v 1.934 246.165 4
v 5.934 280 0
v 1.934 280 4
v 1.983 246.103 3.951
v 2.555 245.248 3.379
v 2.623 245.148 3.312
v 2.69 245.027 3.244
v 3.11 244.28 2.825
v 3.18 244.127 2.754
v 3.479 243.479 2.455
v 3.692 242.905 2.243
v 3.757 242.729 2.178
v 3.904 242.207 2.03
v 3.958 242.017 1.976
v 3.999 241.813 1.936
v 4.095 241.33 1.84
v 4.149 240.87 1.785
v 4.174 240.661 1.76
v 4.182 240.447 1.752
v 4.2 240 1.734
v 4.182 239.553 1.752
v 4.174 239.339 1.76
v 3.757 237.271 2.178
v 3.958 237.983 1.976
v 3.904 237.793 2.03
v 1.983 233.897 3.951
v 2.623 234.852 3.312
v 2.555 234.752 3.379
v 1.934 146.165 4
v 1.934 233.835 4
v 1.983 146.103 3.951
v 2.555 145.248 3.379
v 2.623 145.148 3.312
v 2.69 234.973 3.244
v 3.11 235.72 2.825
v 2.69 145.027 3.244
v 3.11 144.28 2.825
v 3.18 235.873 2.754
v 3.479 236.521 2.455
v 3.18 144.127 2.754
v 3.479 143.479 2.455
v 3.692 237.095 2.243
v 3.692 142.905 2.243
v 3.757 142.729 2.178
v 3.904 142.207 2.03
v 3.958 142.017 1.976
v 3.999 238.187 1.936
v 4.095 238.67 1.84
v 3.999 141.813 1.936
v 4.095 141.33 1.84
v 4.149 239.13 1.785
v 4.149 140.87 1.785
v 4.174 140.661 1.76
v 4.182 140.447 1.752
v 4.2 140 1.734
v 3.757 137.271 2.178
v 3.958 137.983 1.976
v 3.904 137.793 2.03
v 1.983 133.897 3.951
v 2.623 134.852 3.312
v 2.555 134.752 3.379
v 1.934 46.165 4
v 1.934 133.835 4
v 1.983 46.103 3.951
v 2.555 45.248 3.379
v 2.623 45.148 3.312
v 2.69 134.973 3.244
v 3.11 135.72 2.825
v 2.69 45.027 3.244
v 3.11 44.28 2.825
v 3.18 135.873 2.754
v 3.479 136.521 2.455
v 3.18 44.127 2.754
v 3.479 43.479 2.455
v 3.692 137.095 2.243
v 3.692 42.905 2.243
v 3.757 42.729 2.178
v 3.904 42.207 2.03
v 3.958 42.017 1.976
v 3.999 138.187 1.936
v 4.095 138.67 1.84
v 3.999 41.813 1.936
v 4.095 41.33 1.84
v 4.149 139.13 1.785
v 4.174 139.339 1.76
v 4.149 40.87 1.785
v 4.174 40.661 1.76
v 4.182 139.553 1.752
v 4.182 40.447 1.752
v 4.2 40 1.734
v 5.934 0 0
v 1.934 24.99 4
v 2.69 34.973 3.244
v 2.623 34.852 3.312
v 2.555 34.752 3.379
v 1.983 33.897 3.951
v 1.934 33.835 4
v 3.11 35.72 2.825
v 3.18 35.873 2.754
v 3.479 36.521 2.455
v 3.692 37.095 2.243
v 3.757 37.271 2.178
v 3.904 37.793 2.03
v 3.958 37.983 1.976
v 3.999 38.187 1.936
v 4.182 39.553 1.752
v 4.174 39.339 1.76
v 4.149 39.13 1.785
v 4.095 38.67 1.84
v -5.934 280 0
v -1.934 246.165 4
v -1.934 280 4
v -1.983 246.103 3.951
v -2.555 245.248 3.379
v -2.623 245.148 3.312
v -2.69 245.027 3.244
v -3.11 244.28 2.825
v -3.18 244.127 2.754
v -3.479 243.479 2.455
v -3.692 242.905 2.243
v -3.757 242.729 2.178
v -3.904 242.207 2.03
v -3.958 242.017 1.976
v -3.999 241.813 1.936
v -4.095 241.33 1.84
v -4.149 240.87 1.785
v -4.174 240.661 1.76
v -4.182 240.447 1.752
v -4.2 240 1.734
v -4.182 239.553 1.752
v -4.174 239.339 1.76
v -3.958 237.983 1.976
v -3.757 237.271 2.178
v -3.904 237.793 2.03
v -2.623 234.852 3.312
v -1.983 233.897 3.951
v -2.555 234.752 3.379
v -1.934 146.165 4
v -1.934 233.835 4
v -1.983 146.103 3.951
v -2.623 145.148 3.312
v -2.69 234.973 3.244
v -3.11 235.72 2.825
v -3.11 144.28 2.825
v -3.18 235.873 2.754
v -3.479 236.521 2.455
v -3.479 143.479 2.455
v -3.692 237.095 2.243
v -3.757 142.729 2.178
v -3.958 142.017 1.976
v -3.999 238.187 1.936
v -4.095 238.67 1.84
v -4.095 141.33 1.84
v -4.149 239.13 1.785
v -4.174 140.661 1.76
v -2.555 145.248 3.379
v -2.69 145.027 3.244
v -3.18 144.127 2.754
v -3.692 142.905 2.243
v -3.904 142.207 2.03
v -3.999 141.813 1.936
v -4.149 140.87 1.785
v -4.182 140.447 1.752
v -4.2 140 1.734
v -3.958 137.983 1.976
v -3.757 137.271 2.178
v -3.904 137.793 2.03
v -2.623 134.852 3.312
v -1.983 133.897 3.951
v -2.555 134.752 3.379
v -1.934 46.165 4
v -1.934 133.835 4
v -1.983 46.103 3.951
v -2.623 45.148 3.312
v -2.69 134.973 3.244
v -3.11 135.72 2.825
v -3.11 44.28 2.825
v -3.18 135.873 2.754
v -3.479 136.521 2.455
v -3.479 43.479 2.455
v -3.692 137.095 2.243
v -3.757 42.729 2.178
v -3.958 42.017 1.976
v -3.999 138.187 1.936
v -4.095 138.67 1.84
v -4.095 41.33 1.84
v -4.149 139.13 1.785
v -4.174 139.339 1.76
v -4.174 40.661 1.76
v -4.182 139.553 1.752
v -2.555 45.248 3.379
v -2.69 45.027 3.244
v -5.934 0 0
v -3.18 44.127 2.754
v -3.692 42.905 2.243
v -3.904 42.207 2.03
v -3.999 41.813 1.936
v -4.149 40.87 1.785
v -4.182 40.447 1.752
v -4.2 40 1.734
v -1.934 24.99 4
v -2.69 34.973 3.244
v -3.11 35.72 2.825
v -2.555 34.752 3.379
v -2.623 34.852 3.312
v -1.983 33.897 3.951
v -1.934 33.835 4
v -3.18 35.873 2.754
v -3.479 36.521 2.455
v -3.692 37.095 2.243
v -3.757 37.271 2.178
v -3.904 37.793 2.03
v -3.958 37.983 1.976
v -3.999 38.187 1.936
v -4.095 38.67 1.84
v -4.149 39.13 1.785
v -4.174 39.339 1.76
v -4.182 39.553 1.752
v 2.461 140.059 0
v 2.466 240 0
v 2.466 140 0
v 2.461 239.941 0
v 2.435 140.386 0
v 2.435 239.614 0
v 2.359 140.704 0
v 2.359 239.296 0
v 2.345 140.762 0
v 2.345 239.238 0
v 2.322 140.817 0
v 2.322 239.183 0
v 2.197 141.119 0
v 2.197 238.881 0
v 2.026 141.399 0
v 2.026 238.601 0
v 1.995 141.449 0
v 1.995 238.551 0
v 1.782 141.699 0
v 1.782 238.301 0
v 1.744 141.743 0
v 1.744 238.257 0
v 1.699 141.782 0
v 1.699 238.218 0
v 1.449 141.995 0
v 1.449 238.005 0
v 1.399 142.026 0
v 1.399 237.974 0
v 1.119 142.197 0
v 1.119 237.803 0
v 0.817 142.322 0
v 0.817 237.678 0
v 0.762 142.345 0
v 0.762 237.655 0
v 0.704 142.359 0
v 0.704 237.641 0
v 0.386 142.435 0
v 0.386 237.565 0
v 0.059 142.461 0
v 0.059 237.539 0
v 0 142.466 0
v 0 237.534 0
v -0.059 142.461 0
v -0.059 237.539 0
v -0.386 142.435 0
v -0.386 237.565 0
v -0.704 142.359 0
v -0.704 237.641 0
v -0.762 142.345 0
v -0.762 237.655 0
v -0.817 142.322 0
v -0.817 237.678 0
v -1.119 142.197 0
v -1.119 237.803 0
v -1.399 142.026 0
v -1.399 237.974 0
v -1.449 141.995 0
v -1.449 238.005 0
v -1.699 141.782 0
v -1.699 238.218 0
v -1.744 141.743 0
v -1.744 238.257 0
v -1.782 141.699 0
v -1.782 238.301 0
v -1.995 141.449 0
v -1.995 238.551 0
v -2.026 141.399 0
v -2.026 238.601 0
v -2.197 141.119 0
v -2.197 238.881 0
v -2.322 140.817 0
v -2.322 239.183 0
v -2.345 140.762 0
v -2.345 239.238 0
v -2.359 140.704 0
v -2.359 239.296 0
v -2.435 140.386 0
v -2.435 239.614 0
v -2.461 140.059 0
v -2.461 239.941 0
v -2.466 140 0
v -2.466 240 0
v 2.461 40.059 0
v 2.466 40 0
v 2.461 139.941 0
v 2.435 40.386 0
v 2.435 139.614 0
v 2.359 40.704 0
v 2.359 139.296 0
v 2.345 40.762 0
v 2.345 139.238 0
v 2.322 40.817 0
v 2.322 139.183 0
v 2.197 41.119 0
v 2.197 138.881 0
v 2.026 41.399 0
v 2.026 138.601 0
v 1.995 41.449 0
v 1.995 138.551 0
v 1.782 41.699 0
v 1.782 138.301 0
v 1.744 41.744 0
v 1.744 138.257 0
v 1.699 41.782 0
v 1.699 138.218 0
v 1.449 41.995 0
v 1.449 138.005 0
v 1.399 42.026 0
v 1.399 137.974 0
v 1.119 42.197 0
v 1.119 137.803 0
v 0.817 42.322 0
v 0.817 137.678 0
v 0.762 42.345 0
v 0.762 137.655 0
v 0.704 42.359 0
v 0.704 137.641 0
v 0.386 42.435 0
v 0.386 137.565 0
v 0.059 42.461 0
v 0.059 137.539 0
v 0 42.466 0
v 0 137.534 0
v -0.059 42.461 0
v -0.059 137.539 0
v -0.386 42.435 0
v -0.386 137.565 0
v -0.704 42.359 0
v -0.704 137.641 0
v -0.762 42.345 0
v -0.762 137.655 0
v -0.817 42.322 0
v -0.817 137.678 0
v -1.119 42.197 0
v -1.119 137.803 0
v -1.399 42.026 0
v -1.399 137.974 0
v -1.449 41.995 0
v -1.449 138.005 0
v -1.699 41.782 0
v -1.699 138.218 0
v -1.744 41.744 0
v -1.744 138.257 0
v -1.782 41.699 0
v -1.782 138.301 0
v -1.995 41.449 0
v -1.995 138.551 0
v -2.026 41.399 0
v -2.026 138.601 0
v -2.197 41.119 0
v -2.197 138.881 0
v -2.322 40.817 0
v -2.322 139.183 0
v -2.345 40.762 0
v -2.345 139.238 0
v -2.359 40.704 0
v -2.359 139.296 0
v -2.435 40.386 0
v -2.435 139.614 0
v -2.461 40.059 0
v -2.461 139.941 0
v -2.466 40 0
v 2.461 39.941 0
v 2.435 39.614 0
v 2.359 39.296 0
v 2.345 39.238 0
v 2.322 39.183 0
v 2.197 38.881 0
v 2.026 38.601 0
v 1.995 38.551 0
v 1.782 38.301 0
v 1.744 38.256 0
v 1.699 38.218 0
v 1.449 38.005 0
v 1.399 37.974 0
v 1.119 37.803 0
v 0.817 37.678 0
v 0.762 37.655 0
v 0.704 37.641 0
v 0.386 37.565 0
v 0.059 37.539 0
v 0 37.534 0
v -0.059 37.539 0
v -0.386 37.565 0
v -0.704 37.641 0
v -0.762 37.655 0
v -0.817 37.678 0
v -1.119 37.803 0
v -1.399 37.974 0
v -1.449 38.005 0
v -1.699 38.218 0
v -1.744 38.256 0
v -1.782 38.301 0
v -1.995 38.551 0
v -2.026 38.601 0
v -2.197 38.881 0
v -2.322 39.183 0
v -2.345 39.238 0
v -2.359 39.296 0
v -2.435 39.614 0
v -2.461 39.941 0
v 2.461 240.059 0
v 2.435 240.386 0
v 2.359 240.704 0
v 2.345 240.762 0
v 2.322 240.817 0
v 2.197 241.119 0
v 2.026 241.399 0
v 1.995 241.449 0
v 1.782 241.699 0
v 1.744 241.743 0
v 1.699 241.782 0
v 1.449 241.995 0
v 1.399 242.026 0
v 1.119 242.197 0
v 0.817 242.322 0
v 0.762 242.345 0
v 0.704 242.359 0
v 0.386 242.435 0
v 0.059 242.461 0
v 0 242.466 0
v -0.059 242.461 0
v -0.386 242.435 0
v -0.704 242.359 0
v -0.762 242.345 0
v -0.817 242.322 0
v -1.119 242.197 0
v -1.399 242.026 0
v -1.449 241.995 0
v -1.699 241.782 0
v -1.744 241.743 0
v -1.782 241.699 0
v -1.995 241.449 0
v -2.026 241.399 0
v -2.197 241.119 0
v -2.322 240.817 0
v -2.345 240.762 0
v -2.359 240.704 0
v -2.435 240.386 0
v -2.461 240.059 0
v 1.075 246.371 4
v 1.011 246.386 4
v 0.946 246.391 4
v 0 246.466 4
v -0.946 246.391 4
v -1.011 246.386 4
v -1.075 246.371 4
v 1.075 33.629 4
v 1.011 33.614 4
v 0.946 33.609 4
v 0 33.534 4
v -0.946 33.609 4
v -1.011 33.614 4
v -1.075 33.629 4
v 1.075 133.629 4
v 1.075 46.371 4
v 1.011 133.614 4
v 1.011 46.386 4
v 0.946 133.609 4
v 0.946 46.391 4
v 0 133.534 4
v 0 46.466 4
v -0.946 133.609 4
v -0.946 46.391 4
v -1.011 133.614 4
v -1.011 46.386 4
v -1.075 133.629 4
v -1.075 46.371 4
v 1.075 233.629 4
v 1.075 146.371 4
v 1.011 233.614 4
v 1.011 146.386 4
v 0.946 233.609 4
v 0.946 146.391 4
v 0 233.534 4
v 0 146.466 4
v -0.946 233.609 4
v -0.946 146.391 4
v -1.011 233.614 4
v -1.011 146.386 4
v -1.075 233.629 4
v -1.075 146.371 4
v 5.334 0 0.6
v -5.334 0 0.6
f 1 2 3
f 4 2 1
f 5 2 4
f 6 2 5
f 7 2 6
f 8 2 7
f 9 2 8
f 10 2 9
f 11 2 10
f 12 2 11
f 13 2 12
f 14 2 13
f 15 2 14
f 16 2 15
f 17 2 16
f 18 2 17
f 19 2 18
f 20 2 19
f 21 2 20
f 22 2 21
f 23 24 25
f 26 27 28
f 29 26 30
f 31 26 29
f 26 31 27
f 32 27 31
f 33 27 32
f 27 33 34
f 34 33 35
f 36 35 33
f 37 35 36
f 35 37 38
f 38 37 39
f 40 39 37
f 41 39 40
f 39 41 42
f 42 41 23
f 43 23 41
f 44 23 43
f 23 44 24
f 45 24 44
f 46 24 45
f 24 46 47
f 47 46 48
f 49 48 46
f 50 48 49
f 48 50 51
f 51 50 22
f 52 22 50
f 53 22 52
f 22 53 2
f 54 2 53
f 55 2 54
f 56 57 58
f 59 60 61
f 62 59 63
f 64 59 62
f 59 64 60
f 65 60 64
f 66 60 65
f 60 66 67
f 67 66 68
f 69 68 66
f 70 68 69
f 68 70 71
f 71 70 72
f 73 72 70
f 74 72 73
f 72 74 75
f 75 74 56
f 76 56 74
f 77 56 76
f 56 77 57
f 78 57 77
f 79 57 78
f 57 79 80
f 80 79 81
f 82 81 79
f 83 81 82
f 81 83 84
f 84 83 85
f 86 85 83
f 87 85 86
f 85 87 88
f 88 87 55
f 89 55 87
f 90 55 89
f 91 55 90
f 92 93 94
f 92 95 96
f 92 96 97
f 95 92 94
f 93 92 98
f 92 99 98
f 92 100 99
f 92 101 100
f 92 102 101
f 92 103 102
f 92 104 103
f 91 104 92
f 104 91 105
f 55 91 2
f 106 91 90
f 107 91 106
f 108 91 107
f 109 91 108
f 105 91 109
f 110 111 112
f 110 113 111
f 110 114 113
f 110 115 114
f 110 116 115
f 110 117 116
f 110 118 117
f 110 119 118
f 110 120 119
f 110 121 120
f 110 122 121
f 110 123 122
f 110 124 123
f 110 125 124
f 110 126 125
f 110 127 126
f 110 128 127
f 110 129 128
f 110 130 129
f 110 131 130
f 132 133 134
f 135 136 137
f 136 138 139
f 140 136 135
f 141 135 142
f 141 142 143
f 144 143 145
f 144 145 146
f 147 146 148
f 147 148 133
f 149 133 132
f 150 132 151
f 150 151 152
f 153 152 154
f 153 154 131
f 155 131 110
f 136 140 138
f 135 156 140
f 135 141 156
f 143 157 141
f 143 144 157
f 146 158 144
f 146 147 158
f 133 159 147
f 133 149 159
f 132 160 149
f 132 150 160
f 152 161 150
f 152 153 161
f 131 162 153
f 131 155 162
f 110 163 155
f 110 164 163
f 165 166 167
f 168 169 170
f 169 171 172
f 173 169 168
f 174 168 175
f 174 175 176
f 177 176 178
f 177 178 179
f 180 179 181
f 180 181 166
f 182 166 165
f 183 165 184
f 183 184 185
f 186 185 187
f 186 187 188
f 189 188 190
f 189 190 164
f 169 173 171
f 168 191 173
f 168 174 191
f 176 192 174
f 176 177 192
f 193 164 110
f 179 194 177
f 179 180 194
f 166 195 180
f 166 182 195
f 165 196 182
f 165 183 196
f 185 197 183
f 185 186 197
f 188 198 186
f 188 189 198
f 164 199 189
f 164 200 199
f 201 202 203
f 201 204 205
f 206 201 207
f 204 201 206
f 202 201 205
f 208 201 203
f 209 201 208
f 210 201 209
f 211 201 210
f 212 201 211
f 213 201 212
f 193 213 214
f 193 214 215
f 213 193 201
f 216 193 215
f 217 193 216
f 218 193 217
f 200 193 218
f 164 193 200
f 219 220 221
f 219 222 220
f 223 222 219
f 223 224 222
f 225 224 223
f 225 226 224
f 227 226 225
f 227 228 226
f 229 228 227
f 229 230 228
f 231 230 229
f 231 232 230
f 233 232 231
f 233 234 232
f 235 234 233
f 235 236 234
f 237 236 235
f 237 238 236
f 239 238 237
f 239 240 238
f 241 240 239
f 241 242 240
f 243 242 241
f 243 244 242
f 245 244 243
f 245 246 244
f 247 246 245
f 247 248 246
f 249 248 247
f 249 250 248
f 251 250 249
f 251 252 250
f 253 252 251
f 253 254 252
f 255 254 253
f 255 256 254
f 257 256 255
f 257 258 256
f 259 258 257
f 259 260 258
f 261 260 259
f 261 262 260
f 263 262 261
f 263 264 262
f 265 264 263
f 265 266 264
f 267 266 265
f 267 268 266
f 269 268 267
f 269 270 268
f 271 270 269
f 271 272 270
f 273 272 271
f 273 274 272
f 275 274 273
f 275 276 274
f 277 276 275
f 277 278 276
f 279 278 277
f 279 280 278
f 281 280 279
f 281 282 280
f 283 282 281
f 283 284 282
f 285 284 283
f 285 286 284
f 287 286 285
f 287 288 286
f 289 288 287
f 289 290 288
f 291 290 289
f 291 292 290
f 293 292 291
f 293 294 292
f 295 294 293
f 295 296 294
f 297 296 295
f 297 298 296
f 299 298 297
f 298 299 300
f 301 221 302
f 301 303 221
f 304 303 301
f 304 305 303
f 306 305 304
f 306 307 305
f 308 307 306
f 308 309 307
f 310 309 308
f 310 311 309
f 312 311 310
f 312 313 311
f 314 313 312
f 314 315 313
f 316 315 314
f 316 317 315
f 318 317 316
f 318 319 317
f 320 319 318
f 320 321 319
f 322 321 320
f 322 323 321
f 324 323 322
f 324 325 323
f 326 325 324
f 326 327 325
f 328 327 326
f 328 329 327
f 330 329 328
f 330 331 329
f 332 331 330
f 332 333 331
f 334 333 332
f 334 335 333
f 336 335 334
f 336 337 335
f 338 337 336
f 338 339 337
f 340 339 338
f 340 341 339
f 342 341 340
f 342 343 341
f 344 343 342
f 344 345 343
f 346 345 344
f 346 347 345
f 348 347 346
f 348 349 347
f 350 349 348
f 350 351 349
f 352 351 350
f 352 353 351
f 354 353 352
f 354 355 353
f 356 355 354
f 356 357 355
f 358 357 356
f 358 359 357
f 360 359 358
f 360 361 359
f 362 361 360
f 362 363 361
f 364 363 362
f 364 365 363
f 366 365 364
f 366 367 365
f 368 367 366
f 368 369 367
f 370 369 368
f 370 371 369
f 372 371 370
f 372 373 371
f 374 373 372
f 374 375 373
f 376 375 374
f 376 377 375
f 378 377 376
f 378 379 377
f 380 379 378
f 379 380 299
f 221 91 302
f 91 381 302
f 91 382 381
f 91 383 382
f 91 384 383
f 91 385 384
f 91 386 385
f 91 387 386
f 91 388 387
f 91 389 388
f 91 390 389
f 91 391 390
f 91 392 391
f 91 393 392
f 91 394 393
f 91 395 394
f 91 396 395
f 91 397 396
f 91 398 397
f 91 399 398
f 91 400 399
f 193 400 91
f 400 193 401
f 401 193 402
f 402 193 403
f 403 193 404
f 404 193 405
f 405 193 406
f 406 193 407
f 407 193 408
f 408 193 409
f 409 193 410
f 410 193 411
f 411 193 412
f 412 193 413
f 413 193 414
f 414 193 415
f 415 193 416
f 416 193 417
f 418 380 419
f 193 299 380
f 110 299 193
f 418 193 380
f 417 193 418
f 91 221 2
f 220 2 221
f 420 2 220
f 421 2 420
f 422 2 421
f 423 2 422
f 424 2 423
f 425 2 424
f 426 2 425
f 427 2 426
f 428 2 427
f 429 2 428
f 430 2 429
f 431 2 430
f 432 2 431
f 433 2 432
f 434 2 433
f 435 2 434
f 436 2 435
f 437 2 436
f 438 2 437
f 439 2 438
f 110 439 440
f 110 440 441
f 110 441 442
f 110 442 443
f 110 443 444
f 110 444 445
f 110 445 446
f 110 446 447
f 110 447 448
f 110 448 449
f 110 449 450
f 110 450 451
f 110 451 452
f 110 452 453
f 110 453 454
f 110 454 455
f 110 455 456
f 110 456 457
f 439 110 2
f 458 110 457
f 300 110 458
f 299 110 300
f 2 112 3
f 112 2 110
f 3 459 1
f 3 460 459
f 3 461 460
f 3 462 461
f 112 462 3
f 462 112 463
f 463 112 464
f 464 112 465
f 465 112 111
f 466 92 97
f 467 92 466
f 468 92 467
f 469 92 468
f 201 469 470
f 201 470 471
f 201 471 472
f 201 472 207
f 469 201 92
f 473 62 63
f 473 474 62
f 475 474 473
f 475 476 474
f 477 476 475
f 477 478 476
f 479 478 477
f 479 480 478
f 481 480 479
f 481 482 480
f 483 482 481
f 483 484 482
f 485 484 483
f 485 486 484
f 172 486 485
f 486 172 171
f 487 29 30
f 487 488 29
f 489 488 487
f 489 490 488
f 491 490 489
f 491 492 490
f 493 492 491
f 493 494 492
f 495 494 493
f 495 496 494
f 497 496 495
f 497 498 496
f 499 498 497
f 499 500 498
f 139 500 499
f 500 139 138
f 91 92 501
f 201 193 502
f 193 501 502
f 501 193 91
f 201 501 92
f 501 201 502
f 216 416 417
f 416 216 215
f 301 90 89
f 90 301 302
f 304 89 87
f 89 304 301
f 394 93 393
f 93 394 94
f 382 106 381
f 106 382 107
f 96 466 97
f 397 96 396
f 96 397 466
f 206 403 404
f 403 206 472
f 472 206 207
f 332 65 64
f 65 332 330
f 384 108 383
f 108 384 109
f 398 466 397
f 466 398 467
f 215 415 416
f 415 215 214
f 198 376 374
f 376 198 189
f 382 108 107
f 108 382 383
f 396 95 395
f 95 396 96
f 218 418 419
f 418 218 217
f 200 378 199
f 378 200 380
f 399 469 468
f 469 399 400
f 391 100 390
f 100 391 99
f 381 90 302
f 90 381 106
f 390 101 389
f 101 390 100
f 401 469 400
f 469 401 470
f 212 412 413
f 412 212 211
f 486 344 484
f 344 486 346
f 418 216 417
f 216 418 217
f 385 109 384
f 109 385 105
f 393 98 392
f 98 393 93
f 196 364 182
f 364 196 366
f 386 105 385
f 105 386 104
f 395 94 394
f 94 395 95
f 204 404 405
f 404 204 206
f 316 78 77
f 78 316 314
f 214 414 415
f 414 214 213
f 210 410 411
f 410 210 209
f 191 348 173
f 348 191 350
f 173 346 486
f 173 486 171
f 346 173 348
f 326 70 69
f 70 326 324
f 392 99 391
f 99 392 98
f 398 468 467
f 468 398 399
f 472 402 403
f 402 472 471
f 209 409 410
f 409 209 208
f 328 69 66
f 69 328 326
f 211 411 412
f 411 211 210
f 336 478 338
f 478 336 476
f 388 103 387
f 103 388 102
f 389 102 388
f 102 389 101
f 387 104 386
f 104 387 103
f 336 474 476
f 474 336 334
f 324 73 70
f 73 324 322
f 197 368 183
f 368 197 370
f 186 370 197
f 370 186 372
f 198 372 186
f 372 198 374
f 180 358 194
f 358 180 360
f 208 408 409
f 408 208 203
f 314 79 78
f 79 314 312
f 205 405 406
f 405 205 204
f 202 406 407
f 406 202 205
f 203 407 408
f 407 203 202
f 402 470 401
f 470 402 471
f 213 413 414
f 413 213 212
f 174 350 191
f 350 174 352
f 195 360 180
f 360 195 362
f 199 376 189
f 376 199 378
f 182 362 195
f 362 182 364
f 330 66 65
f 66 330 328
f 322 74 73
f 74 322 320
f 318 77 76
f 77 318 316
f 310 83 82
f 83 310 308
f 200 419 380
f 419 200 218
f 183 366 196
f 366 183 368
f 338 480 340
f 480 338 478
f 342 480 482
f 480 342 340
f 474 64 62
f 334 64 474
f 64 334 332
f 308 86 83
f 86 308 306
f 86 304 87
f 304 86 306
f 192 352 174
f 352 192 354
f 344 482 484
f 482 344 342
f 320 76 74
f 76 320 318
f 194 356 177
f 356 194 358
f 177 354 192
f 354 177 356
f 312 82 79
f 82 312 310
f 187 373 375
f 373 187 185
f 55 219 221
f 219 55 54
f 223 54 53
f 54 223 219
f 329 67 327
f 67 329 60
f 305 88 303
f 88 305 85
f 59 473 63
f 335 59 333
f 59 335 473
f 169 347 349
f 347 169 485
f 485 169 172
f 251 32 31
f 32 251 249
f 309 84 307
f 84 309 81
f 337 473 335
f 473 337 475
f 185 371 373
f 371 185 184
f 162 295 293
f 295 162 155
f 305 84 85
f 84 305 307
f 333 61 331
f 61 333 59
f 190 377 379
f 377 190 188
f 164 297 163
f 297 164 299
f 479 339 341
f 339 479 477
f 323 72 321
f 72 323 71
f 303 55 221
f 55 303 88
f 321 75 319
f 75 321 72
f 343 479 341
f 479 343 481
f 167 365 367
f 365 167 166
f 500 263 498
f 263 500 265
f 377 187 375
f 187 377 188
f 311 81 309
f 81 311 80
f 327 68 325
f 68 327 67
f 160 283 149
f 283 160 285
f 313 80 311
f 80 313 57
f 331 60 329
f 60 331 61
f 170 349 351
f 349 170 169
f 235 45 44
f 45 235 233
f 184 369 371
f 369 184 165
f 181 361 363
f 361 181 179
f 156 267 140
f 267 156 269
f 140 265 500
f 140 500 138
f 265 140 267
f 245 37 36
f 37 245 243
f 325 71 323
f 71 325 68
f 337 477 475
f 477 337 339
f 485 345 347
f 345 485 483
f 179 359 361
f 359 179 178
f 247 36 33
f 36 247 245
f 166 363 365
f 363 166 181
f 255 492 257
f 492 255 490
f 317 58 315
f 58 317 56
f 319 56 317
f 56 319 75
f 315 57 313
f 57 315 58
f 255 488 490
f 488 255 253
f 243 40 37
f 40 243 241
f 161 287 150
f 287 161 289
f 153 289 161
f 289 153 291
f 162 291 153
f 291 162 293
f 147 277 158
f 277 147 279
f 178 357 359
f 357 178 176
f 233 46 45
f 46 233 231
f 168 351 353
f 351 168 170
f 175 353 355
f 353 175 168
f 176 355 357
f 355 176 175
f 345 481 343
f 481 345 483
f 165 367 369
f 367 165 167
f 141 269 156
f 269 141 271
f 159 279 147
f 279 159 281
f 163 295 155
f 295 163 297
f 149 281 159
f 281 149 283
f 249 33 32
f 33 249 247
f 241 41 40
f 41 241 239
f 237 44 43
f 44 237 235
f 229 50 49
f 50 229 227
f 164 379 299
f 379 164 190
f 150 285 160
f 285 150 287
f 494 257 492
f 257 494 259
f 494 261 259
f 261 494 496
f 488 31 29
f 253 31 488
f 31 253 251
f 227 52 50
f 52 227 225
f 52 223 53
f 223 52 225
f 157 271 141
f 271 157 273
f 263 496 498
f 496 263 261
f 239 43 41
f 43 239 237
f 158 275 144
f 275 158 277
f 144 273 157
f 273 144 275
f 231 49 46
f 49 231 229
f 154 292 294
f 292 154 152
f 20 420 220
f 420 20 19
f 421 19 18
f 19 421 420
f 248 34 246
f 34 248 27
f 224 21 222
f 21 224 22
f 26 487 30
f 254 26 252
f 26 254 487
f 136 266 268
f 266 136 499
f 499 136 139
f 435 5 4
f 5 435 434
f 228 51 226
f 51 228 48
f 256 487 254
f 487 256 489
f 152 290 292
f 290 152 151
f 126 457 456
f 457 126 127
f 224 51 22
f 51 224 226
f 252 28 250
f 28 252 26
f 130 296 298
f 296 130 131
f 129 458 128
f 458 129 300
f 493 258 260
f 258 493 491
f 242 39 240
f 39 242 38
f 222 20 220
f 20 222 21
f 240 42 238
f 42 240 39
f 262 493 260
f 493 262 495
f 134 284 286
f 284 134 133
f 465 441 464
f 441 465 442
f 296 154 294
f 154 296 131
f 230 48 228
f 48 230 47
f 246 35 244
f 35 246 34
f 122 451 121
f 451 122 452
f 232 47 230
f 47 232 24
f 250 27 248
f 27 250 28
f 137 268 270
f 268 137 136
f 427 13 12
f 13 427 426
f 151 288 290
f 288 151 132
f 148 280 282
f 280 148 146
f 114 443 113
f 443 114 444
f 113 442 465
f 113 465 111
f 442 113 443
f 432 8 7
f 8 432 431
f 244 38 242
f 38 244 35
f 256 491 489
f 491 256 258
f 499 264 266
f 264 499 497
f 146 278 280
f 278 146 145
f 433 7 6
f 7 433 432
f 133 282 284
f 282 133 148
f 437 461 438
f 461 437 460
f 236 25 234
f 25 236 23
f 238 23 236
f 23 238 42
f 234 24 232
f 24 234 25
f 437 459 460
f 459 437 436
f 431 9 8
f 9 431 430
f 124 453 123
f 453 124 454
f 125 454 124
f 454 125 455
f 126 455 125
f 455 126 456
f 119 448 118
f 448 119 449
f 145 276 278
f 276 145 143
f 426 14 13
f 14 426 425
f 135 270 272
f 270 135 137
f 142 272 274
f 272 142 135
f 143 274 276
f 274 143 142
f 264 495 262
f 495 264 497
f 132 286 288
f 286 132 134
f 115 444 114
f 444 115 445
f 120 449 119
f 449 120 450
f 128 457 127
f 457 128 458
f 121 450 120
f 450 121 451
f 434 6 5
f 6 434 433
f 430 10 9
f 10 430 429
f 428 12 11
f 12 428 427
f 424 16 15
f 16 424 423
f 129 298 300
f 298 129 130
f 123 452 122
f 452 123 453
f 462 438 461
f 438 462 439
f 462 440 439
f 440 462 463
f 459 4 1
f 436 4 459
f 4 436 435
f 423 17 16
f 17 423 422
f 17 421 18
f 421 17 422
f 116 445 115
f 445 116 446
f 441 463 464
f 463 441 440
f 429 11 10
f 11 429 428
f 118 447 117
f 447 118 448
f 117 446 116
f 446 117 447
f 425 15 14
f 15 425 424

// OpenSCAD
// =====================================================================
//  Vodiaca lista pre kosiky do skrine
//  Priskrutkuje sa na policu do medzery medzi kosiky (alebo ku stene skrine).
//  Boky hrebena maju 45 st. a kopiruju spodne skosenie kosika
//  (skos_dole v priklad-kosik.scad) -> kosik sa pri zasunuti sam vycentruje
//  a nema kam ujst do strany. Kosik stoji na polici, nie na liste.
//  Vruty so zapustenou hlavou (4x16): hlava je zapustena tak hlboko,
//  aby sa nedotkla skosenia kosika; zahlbenie 90 st. pokracuje plynulo
//  az po vrch hrebena (bez hranatych vyrezov).
//
//  NASTAVENIE SLICERA (Bambu Studio):
//    Tryska ............ 0.6 mm (ide aj 0.4)   Vrstva ......... 0.30 mm
//    Wall loops ........ 3                     Top/bottom ..... 4 / 4
//    Vypln ............. 30 % gyroid           Material ....... PLA
//    Doska ............. Textured PEI          Podpery ........ NIE (boky 45 st.)
//    Orientacia ........ spodkom na dosku
// =====================================================================

/* [Rozmery] */
dlzka   = 280;     // dlzka listy (hlbka kosika je 300; max ~315 na H2C)
typ     = "stred"; // ["stred", "kraj"] stred = medzi dva kosiky, kraj = ku stene skrine
medzera = 3;       // medzera medzi kosikmi (stred) alebo kosikom a stenou (kraj), mm

/* [Volby] */
nabeh      = true;  // predny koniec hrebena zosikmeny – kosik sa lahsie navedie
skrutky    = true;  // diery pre vruty so zapustenou hlavou
pocet_skr  = 3;     // pocet vrutov na listu

/* [Vrut] */
vrut_d     = 4;     // priemer vrutu (4x16)
vrut_hlava = 8;     // priemer zapustenej hlavy (90 st.)

/* [Tlac] */
vola  = 0.4;   // vola medzi bokom hrebena a skosenim kosika (kolmo na plochu)
paska = 0.0;   // hrubka podlozky/pasky pod listou (pri vrutoch 0)

/* [Konstanty – zhodne s kosikom] */
skos_dole = 5;     // 45 st. skosenie spodnej hrany kosika (priklad-kosik.scad)
rezerva_h = 1.0;   // hreben konci o tolko pod koncom skosenia – nikdy nezdvihne kosik
nabeh_l   = 25;    // dlzka nabehu na prednom konci
okraj_skr = 40;    // vzdialenost krajnych vrutov od koncov listy
max_do_polic = 0.5; // o kolko moze spodok hlavy vrutu zajst do police (drevotrieska)
e = 0.01;
$fn = 40;

// ---------------------------------------------------------------------
// Geometria: os x naprieč listou (0 = stred medzery, pri "kraj" = stena),
// os z nahor od polic. Bok kosika vpravo je pri x = g/2, jeho skosenie je
// priamka x + z = g/2 + skos_dole. Bok hrebena je s nou rovnobezny,
// posunuty o volu kolmo -> vodorovne o vola*sqrt(2).
g     = typ == "stred" ? medzera : 2 * medzera;   // "kraj" = polovica stredovej listy
h     = skos_dole - paska - rezerva_h;            // vyska hrebena nad listou
xb    = g/2 + skos_dole - paska - vola*sqrt(2);   // polovicna sirka pri spodku
xt    = xb - h;                                   // polovicna sirka hore

// vrut: zahlbenie 90 st.; vrch hlavy co najvyssie, ale mimo skosenia kosika
r_hl  = (vrut_hlava + 0.4) / 2;                   // polomer zahlbenia hore
r_dr  = (vrut_d + 0.4) / 2;                       // polomer diery pre driek
kuz_h = r_hl - r_dr;                              // hlbka kuzela zahlbenia
xs    = typ == "stred" ? 0 : r_hl;                // poloha vrutu naprieč (kraj: ku stene)
z_hl  = min(h, g/2 + skos_dole - paska - (xs + r_hl) - vola*sqrt(2));  // vrch hlavy

assert(h > 1, "hreben je prilis nizky – zmensi pasku alebo rezervu");
assert(xt > 0.8, "hreben je hore prilis uzky – zvacsi medzeru alebo zmensi volu");
assert(dlzka <= 315, "lista sa nezmesti na podlozku H2C");
assert(!skrutky || z_hl >= kuz_h - max_do_polic,
       str("hlava vrutu sa nezmesti mimo skosenia kosika – zvacsi medzeru (pre typ ",
           typ, " aspon ~", typ == "stred" ? 3 : 5.5, " mm) alebo vypni skrutky"));

echo(str("lista ", typ, ": spodok ", (typ == "stred" ? 2*xb : xb), " mm, vrch ",
         (typ == "stred" ? 2*xt : xt), " mm, vyska ", h, " mm",
         skrutky ? str(", vrch hlavy z = ", z_hl, " mm, hlava zajde do police ",
                       max(0, kuz_h - z_hl), " mm") : ""));

// 2D profil prierezu (x, z)
module profil(hh = h) {
    xt2 = xb - hh;
    if (typ == "stred")
        polygon([[-xb, 0], [xb, 0], [xt2, hh], [-xt2, hh]]);
    else   // kraj: zvisla zadna strana pri stene (x = 0), sikmy bok ku kosiku
        polygon([[0, 0], [xb, 0], [xt2, hh], [0, hh]]);
}

module hranol(hh, l) {   // profil vytiahnuty pozdlz osi y v dlzke l
    rotate([90, 0, 0]) mirror([0, 0, 1]) linear_extrude(l) profil(hh);
}

module diera_vrut() {    // v polohe vrutu
    z0 = z_hl - kuz_h;                                       // spodok kuzela
    translate([0, 0, -e]) cylinder(r = r_dr, h = h + 1);     // driek
    // kuzel 90 st. od drieku az nad vrch hrebena (otvara sa nahor -> bez previsu)
    translate([0, 0, z0]) cylinder(r1 = r_dr, r2 = r_dr + (h + 1 - z0), h = h + 1 - z0);
}

module lista() {
    difference() {
        union() {
            if (nabeh) {
                translate([0, nabeh_l, 0]) hranol(h, dlzka - nabeh_l);
                hull() {   // nabeh: hreben klesa z plnej vysky na 0.6 mm
                    translate([0, nabeh_l - e, 0]) hranol(h, e);
                    hranol(0.6, e);
                }
            } else {
                hranol(h, dlzka);
            }
        }
        if (skrutky) {
            n  = max(1, pocet_skr);
            dy = n > 1 ? (dlzka - 2*okraj_skr) / (n - 1) : 0;
            for (i = [0 : n - 1])
                translate([xs, n > 1 ? okraj_skr + i*dy : dlzka/2, 0]) diera_vrut();
        }
    }
}

lista();
